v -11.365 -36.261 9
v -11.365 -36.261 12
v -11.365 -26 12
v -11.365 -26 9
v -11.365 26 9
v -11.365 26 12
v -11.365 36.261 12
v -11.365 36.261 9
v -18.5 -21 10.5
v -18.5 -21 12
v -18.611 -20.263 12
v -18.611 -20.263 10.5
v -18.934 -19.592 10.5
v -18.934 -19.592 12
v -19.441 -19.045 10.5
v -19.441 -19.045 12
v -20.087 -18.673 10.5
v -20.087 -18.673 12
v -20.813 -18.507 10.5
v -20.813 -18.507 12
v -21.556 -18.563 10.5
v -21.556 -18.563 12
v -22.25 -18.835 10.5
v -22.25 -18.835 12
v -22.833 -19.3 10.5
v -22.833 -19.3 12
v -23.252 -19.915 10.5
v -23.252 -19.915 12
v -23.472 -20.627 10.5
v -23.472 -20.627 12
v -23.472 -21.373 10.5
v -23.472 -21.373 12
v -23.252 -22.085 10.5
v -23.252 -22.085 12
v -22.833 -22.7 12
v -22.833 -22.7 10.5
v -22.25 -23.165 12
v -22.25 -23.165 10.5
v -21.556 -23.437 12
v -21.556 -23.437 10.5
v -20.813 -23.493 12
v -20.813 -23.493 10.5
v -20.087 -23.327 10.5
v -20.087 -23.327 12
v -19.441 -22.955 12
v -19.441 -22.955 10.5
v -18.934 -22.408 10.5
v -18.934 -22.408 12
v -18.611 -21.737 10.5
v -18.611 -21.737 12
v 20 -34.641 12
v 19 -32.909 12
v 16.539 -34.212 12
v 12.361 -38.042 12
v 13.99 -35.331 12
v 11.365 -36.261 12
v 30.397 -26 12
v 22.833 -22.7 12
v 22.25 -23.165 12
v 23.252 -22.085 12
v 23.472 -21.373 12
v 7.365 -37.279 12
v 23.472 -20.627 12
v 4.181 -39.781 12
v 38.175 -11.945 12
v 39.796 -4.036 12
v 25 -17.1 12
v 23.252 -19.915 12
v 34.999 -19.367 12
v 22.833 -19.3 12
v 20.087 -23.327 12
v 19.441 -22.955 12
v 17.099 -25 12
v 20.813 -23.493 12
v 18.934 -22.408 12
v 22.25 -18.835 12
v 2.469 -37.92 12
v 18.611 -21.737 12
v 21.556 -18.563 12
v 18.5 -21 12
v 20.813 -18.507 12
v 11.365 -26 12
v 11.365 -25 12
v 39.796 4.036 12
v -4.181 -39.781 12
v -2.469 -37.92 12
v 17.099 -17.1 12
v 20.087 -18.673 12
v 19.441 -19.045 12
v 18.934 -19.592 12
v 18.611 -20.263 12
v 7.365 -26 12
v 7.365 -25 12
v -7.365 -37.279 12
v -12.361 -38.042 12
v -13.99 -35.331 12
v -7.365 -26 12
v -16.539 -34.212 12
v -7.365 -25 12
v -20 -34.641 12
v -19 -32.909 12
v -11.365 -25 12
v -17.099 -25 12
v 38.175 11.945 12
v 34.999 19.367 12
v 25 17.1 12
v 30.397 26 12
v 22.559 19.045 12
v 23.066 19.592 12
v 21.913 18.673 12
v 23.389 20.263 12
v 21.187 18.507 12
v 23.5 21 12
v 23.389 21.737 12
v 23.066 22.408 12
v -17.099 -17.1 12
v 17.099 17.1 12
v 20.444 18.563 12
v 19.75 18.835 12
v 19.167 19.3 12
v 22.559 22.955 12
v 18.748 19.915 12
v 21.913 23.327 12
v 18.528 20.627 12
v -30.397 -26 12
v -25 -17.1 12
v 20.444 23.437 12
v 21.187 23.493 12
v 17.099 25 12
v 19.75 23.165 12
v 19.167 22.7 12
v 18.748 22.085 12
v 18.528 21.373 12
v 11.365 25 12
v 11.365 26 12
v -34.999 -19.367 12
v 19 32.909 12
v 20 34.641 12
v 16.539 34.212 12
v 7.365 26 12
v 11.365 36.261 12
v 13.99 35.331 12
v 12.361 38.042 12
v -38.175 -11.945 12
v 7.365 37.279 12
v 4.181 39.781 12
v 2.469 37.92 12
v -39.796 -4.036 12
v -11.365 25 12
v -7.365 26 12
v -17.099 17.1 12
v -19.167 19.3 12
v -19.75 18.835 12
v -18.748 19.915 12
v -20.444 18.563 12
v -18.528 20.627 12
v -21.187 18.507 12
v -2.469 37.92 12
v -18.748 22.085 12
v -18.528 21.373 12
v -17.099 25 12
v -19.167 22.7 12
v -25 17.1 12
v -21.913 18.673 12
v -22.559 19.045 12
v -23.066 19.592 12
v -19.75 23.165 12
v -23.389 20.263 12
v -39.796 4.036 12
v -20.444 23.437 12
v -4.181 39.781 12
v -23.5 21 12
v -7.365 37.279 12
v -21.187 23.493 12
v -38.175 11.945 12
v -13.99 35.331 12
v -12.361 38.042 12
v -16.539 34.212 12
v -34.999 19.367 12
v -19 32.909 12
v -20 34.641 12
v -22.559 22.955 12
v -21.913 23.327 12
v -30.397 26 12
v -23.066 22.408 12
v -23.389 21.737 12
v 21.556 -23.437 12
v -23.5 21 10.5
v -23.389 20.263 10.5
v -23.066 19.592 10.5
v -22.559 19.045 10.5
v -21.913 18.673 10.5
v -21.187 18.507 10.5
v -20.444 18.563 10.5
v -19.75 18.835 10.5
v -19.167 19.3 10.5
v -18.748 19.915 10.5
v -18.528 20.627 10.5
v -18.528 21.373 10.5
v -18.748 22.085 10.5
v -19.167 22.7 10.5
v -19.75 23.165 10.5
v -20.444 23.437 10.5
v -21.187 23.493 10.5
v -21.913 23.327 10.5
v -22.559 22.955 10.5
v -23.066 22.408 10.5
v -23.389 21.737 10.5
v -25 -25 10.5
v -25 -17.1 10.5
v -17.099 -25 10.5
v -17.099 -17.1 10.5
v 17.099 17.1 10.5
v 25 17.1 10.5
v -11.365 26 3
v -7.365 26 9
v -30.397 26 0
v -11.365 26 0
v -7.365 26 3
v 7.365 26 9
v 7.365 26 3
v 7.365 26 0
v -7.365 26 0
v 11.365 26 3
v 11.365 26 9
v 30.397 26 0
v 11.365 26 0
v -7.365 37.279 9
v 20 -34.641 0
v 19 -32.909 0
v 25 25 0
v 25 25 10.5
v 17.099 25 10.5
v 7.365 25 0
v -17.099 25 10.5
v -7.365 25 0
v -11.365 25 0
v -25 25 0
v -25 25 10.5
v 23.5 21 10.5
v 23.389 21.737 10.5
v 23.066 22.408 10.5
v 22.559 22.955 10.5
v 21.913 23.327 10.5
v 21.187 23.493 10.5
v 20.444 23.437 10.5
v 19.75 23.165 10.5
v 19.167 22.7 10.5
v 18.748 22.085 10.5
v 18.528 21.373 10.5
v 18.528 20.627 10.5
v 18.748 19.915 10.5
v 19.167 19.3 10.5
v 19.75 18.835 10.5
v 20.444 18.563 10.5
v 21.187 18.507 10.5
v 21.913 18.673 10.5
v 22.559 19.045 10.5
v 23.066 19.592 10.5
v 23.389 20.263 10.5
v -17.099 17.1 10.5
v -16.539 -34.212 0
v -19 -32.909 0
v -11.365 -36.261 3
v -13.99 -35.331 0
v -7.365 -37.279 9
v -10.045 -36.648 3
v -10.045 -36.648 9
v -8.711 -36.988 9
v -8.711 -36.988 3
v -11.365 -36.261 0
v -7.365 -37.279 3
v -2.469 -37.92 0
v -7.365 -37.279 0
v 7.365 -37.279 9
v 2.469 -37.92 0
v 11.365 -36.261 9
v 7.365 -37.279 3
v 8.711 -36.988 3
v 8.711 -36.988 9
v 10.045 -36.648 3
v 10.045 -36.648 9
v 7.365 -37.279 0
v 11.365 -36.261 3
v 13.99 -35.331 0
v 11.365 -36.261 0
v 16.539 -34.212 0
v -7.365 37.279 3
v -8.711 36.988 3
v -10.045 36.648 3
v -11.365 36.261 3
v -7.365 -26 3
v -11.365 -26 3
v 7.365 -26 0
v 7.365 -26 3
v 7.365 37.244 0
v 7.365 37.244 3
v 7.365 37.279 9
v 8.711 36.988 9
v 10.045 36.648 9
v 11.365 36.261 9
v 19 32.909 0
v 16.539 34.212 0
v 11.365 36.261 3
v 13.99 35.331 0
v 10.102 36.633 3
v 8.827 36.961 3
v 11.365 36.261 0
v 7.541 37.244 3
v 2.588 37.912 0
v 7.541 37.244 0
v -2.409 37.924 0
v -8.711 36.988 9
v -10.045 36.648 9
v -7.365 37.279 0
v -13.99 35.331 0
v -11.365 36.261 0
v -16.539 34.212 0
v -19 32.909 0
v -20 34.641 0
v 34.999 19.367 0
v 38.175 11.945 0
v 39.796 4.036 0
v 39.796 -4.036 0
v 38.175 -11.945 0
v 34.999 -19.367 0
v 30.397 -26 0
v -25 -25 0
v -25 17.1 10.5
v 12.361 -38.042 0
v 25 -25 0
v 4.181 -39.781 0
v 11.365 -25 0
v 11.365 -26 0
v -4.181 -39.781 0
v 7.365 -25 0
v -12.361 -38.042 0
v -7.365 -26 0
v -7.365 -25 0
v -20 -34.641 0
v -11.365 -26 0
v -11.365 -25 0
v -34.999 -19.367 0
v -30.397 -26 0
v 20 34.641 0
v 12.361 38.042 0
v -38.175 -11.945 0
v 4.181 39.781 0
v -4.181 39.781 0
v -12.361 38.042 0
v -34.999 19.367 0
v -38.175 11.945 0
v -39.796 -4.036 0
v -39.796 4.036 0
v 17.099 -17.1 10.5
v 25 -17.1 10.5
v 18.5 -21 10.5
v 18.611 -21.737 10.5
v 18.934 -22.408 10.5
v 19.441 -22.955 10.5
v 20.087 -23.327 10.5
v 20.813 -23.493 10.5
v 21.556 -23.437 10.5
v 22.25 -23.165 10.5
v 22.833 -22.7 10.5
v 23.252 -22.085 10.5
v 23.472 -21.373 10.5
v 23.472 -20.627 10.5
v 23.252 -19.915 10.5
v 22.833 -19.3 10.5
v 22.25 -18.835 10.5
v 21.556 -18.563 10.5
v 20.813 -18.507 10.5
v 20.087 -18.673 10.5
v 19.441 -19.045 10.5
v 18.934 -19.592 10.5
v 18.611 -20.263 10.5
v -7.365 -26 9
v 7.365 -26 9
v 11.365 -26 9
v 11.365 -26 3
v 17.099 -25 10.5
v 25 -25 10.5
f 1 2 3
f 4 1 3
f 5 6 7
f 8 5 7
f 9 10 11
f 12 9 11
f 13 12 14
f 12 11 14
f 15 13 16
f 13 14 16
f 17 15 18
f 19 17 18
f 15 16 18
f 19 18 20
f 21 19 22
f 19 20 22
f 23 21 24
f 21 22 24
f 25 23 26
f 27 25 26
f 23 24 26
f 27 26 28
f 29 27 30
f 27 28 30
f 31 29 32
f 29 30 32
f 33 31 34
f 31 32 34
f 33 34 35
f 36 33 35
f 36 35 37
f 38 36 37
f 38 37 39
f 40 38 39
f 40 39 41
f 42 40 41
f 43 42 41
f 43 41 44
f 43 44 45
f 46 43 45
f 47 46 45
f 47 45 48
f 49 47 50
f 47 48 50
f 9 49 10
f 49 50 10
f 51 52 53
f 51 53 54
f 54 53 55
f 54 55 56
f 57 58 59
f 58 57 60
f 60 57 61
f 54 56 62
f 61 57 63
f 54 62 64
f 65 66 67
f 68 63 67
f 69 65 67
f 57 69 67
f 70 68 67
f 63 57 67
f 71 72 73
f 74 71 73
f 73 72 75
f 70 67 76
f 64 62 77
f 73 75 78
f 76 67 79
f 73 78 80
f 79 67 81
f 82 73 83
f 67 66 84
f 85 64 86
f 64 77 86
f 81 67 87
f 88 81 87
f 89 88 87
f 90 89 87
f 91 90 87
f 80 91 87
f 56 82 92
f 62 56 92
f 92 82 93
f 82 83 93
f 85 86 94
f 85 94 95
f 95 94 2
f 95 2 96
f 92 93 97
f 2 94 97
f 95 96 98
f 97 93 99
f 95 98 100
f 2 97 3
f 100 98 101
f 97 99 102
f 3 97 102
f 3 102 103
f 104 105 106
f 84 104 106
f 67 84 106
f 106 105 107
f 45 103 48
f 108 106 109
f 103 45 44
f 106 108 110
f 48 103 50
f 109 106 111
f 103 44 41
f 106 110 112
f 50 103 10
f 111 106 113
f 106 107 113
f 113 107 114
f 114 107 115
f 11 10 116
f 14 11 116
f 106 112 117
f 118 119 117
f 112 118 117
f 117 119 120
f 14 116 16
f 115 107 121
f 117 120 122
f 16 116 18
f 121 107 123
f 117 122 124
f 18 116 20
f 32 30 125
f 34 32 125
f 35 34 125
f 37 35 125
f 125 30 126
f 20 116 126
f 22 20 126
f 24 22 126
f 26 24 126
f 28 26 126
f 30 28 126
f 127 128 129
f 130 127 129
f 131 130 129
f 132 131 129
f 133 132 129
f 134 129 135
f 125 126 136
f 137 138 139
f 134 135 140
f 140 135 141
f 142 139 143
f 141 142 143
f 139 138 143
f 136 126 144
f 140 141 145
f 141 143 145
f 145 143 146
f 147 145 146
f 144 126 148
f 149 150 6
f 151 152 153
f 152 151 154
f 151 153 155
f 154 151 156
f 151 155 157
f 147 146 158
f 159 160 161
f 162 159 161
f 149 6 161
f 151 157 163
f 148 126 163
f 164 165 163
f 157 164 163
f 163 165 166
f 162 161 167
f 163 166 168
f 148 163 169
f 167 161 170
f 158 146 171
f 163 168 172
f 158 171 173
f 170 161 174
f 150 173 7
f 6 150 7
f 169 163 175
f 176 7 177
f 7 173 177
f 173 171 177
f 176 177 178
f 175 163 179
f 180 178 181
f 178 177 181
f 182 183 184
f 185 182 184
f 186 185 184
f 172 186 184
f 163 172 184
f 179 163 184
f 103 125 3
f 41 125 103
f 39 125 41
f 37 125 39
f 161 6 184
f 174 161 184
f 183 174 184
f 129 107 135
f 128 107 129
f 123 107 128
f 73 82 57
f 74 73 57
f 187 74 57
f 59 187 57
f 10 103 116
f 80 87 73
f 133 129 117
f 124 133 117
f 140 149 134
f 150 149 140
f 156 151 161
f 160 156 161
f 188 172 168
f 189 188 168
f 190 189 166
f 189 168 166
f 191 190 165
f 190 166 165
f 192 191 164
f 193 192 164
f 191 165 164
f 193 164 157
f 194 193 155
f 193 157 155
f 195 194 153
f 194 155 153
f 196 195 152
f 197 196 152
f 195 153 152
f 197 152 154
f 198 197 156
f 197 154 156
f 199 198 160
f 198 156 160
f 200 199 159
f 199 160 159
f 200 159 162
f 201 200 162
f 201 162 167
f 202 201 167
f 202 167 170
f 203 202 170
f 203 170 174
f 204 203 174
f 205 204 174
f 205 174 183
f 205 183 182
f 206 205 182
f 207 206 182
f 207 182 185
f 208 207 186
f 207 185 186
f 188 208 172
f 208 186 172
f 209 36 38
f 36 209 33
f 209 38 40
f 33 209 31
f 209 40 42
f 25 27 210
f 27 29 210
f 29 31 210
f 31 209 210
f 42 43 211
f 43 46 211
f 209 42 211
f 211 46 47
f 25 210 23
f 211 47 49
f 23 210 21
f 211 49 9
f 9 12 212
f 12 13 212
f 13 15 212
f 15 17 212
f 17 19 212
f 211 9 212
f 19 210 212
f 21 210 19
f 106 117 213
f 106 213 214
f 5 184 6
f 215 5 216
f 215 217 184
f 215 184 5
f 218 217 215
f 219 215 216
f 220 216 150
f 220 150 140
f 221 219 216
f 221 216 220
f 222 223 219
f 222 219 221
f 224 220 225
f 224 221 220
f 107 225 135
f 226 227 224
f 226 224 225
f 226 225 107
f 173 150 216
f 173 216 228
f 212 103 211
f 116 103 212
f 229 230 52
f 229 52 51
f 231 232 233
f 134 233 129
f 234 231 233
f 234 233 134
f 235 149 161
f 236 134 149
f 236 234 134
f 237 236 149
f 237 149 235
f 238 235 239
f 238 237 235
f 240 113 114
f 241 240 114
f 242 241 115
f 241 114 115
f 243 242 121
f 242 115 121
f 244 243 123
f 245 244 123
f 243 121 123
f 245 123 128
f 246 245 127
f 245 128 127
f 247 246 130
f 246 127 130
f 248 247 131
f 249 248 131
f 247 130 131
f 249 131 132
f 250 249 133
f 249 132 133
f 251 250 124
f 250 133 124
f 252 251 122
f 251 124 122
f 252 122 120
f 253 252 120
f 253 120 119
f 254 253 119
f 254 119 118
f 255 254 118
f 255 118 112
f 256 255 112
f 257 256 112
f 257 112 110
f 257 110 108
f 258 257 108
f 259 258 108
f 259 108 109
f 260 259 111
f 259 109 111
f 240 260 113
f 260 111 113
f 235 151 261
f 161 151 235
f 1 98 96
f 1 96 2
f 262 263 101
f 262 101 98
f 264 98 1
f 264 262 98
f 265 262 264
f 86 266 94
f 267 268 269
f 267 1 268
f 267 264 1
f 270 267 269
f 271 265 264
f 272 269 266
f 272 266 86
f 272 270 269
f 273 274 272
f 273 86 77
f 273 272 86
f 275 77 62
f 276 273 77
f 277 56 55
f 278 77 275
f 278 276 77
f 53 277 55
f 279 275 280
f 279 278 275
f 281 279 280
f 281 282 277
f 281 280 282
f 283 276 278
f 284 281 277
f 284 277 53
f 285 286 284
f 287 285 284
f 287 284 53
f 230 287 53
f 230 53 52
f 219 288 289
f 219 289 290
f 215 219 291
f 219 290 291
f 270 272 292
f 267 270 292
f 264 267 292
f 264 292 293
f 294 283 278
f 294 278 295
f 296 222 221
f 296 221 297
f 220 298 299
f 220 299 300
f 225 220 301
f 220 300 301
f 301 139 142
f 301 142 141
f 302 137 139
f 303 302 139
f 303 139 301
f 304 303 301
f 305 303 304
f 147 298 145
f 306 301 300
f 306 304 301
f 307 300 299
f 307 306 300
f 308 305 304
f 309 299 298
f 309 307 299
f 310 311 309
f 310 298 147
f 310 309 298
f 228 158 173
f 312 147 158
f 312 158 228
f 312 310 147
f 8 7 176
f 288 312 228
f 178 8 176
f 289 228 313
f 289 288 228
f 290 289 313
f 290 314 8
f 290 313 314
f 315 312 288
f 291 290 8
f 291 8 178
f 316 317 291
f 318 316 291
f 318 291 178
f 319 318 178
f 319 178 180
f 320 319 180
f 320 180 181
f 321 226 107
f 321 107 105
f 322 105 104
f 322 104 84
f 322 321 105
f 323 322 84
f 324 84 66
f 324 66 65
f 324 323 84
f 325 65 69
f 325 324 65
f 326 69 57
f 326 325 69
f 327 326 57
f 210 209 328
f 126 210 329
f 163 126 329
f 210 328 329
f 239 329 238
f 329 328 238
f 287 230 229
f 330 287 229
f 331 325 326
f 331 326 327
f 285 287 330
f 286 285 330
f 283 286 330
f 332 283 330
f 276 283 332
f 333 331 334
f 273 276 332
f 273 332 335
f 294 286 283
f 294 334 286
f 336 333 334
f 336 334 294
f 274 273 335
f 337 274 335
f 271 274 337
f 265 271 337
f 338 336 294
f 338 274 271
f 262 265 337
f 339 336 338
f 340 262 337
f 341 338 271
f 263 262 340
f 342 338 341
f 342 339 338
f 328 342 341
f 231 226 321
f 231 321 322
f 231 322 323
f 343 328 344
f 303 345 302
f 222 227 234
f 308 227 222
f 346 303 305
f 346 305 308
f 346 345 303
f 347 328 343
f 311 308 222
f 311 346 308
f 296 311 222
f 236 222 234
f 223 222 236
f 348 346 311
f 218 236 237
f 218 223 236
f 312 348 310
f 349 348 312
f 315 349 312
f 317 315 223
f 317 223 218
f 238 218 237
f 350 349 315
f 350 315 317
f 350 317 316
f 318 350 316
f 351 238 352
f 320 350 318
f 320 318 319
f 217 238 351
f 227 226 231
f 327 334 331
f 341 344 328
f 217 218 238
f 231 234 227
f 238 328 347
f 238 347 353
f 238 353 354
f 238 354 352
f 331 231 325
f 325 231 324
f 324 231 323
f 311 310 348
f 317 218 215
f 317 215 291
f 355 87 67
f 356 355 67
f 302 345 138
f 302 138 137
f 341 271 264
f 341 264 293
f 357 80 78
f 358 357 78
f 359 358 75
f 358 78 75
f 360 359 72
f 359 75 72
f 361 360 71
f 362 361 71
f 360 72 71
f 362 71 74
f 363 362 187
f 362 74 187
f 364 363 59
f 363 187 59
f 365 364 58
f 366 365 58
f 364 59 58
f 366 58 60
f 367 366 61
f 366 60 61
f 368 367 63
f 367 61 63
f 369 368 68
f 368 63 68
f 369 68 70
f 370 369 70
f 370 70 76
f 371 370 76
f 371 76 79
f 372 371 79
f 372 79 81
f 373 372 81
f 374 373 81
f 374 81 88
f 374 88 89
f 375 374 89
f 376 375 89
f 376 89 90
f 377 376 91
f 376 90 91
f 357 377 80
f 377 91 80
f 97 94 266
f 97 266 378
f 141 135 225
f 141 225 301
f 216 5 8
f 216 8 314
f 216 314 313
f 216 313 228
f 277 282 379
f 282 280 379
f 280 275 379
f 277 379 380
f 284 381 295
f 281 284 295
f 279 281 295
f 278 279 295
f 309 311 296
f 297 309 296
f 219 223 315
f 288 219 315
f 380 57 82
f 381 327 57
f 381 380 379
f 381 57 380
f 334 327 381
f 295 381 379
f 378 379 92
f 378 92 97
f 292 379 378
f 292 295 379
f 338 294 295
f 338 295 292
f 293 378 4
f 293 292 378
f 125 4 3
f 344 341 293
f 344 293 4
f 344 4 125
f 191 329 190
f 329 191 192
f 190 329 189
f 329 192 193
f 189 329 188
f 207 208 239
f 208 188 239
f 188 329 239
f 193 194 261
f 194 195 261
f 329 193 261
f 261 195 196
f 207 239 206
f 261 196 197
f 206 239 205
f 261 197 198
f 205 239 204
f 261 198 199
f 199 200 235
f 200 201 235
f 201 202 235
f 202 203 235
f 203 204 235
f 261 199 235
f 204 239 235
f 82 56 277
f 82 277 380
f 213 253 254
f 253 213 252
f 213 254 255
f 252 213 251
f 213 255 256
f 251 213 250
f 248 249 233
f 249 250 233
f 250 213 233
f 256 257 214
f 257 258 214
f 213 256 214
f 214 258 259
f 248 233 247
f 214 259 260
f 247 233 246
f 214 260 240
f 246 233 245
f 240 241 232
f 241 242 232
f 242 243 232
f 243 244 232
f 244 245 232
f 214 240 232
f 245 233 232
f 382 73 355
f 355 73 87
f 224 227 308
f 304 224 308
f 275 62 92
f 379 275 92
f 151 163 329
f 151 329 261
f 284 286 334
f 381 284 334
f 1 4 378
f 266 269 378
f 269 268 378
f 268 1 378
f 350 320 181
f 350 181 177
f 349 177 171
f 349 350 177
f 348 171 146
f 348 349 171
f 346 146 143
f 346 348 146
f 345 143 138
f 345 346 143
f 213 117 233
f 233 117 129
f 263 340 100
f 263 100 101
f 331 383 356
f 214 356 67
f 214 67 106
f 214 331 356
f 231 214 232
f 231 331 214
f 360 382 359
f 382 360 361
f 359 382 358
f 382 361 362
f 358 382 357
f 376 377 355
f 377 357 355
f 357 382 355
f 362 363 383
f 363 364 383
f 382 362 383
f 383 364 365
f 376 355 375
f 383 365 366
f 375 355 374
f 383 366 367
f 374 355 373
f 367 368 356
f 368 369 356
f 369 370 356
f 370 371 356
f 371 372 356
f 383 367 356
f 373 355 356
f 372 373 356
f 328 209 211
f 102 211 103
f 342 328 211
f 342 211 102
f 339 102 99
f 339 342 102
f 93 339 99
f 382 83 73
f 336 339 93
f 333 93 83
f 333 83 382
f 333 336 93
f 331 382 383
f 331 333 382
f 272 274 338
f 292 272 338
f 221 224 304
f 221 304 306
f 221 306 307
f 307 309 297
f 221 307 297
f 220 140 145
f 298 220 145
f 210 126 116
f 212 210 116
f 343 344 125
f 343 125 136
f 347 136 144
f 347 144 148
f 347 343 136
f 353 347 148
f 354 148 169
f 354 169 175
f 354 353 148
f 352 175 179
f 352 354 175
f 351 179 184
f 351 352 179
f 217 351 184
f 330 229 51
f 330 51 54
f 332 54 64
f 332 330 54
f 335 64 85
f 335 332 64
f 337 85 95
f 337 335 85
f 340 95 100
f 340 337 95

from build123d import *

# Parameters (mm, degrees)
BOSS_EXTRUDE1_DEPTH   = 12
BOSS_EXTRUDE1_2_DEPTH = 12
SKETCH1_W             = 50
SKETCH1_H             = 50
BOSS_EXTRUDE1_3_DEPTH = 12
SKETCH2_W             = 4
SKETCH2_H             = 12.279350853
BOSS_EXTRUDE2_DEPTH   = 3
SKETCH3_W             = 4
SKETCH3_H             = 12.244216487
SKETCH3_H_2           = 12.279350853
BOSS_EXTRUDE3_DEPTH   = 3
SKETCH4_W             = 13.297909738
SKETCH4_H             = 8.9
SKETCH4_R             = 2.5
BOSS_EXTRUDE4_DEPTH   = 1.5


with BuildPart() as part:
    # Sketch1 → Boss-Extrude1 (new body)
    with BuildSketch(Plane.XY):
        with BuildLine():
            Line((-19, 32.908965344), (-20, 34.641016151))
            ThreePointArc((-20, 34.641016151), (0, 40), (20, 34.641016151))
            Line((20, 34.641016151), (19, 32.908965344))
            ThreePointArc((19, 32.908965344), (0, 38), (-19, 32.908965344))
        make_face()
    extrude(amount=BOSS_EXTRUDE1_DEPTH)



with BuildPart() as body_2:
    # Sketch1 → Boss-Extrude1 2 (new body)
    with BuildSketch(Plane.XY):
        with BuildLine():
            Line((19, -32.908965344), (20, -34.641016151))
            ThreePointArc((20, -34.641016151), (0, -40), (-20, -34.641016151))
            Line((-20, -34.641016151), (-19, -32.908965344))
            ThreePointArc((-19, -32.908965344), (0, -38), (19, -32.908965344))
        make_face()
    extrude(amount=BOSS_EXTRUDE1_2_DEPTH)


with BuildPart() as body_3:
    # Sketch1 → Boss-Extrude1 3 (new body)
    with BuildSketch(Plane.XY):
        with BuildLine():
            Line((-30.397368307, 26), (-26, 26))
            Line((-26, 26), (23.958297101, 26))
            Line((23.958297101, 26), (30.397368307, 26))
            ThreePointArc((30.397368307, 26), (40, 0), (30.397368307, -26))
            Line((30.397368307, -26), (23.958297101, -26))
            Line((23.958297101, -26), (-26, -26))
            Line((-26, -26), (-30.397368307, -26))
            ThreePointArc((-30.397368307, -26), (-40, 0), (-30.397368307, 26))
        make_face()
        Rectangle(SKETCH1_W, SKETCH1_H, mode=Mode.SUBTRACT)
    extrude(amount=BOSS_EXTRUDE1_3_DEPTH)


with BuildPart() as part_1:
    add(part.part)

    add(body_2.part)  # Boss-Extrude2 merges body 2

    add(body_3.part)  # Boss-Extrude2 merges body 3
    # Sketch2 → Boss-Extrude2 (add)
    with BuildSketch(Plane.XY.offset(12)):
        with Locations((-9.365459931, 31.139675427)):
            Rectangle(SKETCH2_W, SKETCH2_H)
        with Locations((9.365459931, 31.139675427)):
            Rectangle(SKETCH2_W, SKETCH2_H)
        with Locations((9.365459931, -31.139675427)):
            Rectangle(SKETCH2_W, SKETCH2_H)
        with Locations((-9.365459931, -31.139675427)):
            Rectangle(SKETCH2_W, SKETCH2_H)
    extrude(amount=-BOSS_EXTRUDE2_DEPTH)

    # Sketch3 → Boss-Extrude3 (add)
    with BuildSketch(Plane(origin=(0, 0, 0), x_dir=(-1, 0, 0), z_dir=(0, 0, -1))):
        with Locations((-9.365459931, 31.122108244)):
            Rectangle(SKETCH3_W, SKETCH3_H)
        with Locations((9.365459931, 31.139675427)):
            Rectangle(SKETCH3_W, SKETCH3_H_2)
        with Locations((-9.365459931, -31.139675427)):
            Rectangle(SKETCH3_W, SKETCH3_H_2)
        with Locations((9.365459931, -31.139675427)):
            Rectangle(SKETCH3_W, SKETCH3_H_2)
    extrude(amount=-BOSS_EXTRUDE3_DEPTH)

    # Sketch4 → Boss-Extrude4 (add)
    # profile 1 of 4: a face of its own
    with BuildSketch(Plane.XY.offset(12)):
        with Locations((-23.748413438, -21.55)):
            Rectangle(SKETCH4_W, SKETCH4_H)
        with Locations((-21, -21)):
            Circle(SKETCH4_R, mode=Mode.SUBTRACT)
    # profile 2 of 4: a face of its own
    with BuildSketch(Plane.XY.offset(12)):
        with Locations((23.748413438, -21.55)):
            Rectangle(SKETCH4_W, SKETCH4_H)
        with Locations(Location((21, -21, 0), (0, 0, 180))):
            Circle(SKETCH4_R, mode=Mode.SUBTRACT)
    # profile 3 of 4: a face of its own
    with BuildSketch(Plane.XY.offset(12)):
        with Locations((23.748413438, 21.55)):
            Rectangle(SKETCH4_W, SKETCH4_H)
        with Locations((21, 21)):
            Circle(SKETCH4_R, mode=Mode.SUBTRACT)
    # profile 4 of 4: a face of its own
    with BuildSketch(Plane.XY.offset(12)):
        with Locations((-23.748413438, 21.55)):
            Rectangle(SKETCH4_W, SKETCH4_H)
        with Locations(Location((-21, 21, 0), (0, 0, 180))):
            Circle(SKETCH4_R, mode=Mode.SUBTRACT)
    extrude(amount=-BOSS_EXTRUDE4_DEPTH)


solid = part_1.part
